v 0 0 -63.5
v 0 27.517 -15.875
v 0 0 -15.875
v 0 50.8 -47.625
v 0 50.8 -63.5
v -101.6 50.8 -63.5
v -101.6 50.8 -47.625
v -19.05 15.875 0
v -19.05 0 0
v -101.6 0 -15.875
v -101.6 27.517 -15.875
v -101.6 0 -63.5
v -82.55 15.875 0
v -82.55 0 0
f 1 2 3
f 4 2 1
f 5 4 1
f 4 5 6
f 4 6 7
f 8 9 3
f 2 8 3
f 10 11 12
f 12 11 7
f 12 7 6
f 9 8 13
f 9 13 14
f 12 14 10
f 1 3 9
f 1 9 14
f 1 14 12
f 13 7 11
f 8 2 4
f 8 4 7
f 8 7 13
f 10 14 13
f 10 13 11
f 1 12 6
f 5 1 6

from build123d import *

# Parameters (mm, degrees)
BOSS_EXTRUDE1_DEPTH = 101.6
CUT_EXTRUDE1_DEPTH  = 101.6
CUT_EXTRUDE2_DEPTH  = 101.6


with BuildPart() as part:
    # Sketch1 → Boss-Extrude1 (new body)
    with BuildSketch(Plane(origin=(0, 0, 0), x_dir=(0, 0, -1), z_dir=(1, 0, 0))):
        Polygon((0, 0), (63.5, 0), (63.5, 50.8), (47.625, 50.8), (0, 15.875), align=None)
    extrude(amount=-BOSS_EXTRUDE1_DEPTH)

    # Sketch3 → Cut-Extrude1 (cut)
    with BuildSketch(Plane.XZ):
        Polygon((0, 0), (-19.05, 0), (0, -15.875), align=None)
    extrude(amount=-CUT_EXTRUDE1_DEPTH, mode=Mode.SUBTRACT)

    # Sketch4 → Cut-Extrude2 (cut)
    with BuildSketch(Plane.XZ):
        Polygon((-101.6, 0), (-82.55, 0), (-101.6, -15.875), align=None)
    extrude(amount=-CUT_EXTRUDE2_DEPTH, mode=Mode.SUBTRACT)


solid = part.part
